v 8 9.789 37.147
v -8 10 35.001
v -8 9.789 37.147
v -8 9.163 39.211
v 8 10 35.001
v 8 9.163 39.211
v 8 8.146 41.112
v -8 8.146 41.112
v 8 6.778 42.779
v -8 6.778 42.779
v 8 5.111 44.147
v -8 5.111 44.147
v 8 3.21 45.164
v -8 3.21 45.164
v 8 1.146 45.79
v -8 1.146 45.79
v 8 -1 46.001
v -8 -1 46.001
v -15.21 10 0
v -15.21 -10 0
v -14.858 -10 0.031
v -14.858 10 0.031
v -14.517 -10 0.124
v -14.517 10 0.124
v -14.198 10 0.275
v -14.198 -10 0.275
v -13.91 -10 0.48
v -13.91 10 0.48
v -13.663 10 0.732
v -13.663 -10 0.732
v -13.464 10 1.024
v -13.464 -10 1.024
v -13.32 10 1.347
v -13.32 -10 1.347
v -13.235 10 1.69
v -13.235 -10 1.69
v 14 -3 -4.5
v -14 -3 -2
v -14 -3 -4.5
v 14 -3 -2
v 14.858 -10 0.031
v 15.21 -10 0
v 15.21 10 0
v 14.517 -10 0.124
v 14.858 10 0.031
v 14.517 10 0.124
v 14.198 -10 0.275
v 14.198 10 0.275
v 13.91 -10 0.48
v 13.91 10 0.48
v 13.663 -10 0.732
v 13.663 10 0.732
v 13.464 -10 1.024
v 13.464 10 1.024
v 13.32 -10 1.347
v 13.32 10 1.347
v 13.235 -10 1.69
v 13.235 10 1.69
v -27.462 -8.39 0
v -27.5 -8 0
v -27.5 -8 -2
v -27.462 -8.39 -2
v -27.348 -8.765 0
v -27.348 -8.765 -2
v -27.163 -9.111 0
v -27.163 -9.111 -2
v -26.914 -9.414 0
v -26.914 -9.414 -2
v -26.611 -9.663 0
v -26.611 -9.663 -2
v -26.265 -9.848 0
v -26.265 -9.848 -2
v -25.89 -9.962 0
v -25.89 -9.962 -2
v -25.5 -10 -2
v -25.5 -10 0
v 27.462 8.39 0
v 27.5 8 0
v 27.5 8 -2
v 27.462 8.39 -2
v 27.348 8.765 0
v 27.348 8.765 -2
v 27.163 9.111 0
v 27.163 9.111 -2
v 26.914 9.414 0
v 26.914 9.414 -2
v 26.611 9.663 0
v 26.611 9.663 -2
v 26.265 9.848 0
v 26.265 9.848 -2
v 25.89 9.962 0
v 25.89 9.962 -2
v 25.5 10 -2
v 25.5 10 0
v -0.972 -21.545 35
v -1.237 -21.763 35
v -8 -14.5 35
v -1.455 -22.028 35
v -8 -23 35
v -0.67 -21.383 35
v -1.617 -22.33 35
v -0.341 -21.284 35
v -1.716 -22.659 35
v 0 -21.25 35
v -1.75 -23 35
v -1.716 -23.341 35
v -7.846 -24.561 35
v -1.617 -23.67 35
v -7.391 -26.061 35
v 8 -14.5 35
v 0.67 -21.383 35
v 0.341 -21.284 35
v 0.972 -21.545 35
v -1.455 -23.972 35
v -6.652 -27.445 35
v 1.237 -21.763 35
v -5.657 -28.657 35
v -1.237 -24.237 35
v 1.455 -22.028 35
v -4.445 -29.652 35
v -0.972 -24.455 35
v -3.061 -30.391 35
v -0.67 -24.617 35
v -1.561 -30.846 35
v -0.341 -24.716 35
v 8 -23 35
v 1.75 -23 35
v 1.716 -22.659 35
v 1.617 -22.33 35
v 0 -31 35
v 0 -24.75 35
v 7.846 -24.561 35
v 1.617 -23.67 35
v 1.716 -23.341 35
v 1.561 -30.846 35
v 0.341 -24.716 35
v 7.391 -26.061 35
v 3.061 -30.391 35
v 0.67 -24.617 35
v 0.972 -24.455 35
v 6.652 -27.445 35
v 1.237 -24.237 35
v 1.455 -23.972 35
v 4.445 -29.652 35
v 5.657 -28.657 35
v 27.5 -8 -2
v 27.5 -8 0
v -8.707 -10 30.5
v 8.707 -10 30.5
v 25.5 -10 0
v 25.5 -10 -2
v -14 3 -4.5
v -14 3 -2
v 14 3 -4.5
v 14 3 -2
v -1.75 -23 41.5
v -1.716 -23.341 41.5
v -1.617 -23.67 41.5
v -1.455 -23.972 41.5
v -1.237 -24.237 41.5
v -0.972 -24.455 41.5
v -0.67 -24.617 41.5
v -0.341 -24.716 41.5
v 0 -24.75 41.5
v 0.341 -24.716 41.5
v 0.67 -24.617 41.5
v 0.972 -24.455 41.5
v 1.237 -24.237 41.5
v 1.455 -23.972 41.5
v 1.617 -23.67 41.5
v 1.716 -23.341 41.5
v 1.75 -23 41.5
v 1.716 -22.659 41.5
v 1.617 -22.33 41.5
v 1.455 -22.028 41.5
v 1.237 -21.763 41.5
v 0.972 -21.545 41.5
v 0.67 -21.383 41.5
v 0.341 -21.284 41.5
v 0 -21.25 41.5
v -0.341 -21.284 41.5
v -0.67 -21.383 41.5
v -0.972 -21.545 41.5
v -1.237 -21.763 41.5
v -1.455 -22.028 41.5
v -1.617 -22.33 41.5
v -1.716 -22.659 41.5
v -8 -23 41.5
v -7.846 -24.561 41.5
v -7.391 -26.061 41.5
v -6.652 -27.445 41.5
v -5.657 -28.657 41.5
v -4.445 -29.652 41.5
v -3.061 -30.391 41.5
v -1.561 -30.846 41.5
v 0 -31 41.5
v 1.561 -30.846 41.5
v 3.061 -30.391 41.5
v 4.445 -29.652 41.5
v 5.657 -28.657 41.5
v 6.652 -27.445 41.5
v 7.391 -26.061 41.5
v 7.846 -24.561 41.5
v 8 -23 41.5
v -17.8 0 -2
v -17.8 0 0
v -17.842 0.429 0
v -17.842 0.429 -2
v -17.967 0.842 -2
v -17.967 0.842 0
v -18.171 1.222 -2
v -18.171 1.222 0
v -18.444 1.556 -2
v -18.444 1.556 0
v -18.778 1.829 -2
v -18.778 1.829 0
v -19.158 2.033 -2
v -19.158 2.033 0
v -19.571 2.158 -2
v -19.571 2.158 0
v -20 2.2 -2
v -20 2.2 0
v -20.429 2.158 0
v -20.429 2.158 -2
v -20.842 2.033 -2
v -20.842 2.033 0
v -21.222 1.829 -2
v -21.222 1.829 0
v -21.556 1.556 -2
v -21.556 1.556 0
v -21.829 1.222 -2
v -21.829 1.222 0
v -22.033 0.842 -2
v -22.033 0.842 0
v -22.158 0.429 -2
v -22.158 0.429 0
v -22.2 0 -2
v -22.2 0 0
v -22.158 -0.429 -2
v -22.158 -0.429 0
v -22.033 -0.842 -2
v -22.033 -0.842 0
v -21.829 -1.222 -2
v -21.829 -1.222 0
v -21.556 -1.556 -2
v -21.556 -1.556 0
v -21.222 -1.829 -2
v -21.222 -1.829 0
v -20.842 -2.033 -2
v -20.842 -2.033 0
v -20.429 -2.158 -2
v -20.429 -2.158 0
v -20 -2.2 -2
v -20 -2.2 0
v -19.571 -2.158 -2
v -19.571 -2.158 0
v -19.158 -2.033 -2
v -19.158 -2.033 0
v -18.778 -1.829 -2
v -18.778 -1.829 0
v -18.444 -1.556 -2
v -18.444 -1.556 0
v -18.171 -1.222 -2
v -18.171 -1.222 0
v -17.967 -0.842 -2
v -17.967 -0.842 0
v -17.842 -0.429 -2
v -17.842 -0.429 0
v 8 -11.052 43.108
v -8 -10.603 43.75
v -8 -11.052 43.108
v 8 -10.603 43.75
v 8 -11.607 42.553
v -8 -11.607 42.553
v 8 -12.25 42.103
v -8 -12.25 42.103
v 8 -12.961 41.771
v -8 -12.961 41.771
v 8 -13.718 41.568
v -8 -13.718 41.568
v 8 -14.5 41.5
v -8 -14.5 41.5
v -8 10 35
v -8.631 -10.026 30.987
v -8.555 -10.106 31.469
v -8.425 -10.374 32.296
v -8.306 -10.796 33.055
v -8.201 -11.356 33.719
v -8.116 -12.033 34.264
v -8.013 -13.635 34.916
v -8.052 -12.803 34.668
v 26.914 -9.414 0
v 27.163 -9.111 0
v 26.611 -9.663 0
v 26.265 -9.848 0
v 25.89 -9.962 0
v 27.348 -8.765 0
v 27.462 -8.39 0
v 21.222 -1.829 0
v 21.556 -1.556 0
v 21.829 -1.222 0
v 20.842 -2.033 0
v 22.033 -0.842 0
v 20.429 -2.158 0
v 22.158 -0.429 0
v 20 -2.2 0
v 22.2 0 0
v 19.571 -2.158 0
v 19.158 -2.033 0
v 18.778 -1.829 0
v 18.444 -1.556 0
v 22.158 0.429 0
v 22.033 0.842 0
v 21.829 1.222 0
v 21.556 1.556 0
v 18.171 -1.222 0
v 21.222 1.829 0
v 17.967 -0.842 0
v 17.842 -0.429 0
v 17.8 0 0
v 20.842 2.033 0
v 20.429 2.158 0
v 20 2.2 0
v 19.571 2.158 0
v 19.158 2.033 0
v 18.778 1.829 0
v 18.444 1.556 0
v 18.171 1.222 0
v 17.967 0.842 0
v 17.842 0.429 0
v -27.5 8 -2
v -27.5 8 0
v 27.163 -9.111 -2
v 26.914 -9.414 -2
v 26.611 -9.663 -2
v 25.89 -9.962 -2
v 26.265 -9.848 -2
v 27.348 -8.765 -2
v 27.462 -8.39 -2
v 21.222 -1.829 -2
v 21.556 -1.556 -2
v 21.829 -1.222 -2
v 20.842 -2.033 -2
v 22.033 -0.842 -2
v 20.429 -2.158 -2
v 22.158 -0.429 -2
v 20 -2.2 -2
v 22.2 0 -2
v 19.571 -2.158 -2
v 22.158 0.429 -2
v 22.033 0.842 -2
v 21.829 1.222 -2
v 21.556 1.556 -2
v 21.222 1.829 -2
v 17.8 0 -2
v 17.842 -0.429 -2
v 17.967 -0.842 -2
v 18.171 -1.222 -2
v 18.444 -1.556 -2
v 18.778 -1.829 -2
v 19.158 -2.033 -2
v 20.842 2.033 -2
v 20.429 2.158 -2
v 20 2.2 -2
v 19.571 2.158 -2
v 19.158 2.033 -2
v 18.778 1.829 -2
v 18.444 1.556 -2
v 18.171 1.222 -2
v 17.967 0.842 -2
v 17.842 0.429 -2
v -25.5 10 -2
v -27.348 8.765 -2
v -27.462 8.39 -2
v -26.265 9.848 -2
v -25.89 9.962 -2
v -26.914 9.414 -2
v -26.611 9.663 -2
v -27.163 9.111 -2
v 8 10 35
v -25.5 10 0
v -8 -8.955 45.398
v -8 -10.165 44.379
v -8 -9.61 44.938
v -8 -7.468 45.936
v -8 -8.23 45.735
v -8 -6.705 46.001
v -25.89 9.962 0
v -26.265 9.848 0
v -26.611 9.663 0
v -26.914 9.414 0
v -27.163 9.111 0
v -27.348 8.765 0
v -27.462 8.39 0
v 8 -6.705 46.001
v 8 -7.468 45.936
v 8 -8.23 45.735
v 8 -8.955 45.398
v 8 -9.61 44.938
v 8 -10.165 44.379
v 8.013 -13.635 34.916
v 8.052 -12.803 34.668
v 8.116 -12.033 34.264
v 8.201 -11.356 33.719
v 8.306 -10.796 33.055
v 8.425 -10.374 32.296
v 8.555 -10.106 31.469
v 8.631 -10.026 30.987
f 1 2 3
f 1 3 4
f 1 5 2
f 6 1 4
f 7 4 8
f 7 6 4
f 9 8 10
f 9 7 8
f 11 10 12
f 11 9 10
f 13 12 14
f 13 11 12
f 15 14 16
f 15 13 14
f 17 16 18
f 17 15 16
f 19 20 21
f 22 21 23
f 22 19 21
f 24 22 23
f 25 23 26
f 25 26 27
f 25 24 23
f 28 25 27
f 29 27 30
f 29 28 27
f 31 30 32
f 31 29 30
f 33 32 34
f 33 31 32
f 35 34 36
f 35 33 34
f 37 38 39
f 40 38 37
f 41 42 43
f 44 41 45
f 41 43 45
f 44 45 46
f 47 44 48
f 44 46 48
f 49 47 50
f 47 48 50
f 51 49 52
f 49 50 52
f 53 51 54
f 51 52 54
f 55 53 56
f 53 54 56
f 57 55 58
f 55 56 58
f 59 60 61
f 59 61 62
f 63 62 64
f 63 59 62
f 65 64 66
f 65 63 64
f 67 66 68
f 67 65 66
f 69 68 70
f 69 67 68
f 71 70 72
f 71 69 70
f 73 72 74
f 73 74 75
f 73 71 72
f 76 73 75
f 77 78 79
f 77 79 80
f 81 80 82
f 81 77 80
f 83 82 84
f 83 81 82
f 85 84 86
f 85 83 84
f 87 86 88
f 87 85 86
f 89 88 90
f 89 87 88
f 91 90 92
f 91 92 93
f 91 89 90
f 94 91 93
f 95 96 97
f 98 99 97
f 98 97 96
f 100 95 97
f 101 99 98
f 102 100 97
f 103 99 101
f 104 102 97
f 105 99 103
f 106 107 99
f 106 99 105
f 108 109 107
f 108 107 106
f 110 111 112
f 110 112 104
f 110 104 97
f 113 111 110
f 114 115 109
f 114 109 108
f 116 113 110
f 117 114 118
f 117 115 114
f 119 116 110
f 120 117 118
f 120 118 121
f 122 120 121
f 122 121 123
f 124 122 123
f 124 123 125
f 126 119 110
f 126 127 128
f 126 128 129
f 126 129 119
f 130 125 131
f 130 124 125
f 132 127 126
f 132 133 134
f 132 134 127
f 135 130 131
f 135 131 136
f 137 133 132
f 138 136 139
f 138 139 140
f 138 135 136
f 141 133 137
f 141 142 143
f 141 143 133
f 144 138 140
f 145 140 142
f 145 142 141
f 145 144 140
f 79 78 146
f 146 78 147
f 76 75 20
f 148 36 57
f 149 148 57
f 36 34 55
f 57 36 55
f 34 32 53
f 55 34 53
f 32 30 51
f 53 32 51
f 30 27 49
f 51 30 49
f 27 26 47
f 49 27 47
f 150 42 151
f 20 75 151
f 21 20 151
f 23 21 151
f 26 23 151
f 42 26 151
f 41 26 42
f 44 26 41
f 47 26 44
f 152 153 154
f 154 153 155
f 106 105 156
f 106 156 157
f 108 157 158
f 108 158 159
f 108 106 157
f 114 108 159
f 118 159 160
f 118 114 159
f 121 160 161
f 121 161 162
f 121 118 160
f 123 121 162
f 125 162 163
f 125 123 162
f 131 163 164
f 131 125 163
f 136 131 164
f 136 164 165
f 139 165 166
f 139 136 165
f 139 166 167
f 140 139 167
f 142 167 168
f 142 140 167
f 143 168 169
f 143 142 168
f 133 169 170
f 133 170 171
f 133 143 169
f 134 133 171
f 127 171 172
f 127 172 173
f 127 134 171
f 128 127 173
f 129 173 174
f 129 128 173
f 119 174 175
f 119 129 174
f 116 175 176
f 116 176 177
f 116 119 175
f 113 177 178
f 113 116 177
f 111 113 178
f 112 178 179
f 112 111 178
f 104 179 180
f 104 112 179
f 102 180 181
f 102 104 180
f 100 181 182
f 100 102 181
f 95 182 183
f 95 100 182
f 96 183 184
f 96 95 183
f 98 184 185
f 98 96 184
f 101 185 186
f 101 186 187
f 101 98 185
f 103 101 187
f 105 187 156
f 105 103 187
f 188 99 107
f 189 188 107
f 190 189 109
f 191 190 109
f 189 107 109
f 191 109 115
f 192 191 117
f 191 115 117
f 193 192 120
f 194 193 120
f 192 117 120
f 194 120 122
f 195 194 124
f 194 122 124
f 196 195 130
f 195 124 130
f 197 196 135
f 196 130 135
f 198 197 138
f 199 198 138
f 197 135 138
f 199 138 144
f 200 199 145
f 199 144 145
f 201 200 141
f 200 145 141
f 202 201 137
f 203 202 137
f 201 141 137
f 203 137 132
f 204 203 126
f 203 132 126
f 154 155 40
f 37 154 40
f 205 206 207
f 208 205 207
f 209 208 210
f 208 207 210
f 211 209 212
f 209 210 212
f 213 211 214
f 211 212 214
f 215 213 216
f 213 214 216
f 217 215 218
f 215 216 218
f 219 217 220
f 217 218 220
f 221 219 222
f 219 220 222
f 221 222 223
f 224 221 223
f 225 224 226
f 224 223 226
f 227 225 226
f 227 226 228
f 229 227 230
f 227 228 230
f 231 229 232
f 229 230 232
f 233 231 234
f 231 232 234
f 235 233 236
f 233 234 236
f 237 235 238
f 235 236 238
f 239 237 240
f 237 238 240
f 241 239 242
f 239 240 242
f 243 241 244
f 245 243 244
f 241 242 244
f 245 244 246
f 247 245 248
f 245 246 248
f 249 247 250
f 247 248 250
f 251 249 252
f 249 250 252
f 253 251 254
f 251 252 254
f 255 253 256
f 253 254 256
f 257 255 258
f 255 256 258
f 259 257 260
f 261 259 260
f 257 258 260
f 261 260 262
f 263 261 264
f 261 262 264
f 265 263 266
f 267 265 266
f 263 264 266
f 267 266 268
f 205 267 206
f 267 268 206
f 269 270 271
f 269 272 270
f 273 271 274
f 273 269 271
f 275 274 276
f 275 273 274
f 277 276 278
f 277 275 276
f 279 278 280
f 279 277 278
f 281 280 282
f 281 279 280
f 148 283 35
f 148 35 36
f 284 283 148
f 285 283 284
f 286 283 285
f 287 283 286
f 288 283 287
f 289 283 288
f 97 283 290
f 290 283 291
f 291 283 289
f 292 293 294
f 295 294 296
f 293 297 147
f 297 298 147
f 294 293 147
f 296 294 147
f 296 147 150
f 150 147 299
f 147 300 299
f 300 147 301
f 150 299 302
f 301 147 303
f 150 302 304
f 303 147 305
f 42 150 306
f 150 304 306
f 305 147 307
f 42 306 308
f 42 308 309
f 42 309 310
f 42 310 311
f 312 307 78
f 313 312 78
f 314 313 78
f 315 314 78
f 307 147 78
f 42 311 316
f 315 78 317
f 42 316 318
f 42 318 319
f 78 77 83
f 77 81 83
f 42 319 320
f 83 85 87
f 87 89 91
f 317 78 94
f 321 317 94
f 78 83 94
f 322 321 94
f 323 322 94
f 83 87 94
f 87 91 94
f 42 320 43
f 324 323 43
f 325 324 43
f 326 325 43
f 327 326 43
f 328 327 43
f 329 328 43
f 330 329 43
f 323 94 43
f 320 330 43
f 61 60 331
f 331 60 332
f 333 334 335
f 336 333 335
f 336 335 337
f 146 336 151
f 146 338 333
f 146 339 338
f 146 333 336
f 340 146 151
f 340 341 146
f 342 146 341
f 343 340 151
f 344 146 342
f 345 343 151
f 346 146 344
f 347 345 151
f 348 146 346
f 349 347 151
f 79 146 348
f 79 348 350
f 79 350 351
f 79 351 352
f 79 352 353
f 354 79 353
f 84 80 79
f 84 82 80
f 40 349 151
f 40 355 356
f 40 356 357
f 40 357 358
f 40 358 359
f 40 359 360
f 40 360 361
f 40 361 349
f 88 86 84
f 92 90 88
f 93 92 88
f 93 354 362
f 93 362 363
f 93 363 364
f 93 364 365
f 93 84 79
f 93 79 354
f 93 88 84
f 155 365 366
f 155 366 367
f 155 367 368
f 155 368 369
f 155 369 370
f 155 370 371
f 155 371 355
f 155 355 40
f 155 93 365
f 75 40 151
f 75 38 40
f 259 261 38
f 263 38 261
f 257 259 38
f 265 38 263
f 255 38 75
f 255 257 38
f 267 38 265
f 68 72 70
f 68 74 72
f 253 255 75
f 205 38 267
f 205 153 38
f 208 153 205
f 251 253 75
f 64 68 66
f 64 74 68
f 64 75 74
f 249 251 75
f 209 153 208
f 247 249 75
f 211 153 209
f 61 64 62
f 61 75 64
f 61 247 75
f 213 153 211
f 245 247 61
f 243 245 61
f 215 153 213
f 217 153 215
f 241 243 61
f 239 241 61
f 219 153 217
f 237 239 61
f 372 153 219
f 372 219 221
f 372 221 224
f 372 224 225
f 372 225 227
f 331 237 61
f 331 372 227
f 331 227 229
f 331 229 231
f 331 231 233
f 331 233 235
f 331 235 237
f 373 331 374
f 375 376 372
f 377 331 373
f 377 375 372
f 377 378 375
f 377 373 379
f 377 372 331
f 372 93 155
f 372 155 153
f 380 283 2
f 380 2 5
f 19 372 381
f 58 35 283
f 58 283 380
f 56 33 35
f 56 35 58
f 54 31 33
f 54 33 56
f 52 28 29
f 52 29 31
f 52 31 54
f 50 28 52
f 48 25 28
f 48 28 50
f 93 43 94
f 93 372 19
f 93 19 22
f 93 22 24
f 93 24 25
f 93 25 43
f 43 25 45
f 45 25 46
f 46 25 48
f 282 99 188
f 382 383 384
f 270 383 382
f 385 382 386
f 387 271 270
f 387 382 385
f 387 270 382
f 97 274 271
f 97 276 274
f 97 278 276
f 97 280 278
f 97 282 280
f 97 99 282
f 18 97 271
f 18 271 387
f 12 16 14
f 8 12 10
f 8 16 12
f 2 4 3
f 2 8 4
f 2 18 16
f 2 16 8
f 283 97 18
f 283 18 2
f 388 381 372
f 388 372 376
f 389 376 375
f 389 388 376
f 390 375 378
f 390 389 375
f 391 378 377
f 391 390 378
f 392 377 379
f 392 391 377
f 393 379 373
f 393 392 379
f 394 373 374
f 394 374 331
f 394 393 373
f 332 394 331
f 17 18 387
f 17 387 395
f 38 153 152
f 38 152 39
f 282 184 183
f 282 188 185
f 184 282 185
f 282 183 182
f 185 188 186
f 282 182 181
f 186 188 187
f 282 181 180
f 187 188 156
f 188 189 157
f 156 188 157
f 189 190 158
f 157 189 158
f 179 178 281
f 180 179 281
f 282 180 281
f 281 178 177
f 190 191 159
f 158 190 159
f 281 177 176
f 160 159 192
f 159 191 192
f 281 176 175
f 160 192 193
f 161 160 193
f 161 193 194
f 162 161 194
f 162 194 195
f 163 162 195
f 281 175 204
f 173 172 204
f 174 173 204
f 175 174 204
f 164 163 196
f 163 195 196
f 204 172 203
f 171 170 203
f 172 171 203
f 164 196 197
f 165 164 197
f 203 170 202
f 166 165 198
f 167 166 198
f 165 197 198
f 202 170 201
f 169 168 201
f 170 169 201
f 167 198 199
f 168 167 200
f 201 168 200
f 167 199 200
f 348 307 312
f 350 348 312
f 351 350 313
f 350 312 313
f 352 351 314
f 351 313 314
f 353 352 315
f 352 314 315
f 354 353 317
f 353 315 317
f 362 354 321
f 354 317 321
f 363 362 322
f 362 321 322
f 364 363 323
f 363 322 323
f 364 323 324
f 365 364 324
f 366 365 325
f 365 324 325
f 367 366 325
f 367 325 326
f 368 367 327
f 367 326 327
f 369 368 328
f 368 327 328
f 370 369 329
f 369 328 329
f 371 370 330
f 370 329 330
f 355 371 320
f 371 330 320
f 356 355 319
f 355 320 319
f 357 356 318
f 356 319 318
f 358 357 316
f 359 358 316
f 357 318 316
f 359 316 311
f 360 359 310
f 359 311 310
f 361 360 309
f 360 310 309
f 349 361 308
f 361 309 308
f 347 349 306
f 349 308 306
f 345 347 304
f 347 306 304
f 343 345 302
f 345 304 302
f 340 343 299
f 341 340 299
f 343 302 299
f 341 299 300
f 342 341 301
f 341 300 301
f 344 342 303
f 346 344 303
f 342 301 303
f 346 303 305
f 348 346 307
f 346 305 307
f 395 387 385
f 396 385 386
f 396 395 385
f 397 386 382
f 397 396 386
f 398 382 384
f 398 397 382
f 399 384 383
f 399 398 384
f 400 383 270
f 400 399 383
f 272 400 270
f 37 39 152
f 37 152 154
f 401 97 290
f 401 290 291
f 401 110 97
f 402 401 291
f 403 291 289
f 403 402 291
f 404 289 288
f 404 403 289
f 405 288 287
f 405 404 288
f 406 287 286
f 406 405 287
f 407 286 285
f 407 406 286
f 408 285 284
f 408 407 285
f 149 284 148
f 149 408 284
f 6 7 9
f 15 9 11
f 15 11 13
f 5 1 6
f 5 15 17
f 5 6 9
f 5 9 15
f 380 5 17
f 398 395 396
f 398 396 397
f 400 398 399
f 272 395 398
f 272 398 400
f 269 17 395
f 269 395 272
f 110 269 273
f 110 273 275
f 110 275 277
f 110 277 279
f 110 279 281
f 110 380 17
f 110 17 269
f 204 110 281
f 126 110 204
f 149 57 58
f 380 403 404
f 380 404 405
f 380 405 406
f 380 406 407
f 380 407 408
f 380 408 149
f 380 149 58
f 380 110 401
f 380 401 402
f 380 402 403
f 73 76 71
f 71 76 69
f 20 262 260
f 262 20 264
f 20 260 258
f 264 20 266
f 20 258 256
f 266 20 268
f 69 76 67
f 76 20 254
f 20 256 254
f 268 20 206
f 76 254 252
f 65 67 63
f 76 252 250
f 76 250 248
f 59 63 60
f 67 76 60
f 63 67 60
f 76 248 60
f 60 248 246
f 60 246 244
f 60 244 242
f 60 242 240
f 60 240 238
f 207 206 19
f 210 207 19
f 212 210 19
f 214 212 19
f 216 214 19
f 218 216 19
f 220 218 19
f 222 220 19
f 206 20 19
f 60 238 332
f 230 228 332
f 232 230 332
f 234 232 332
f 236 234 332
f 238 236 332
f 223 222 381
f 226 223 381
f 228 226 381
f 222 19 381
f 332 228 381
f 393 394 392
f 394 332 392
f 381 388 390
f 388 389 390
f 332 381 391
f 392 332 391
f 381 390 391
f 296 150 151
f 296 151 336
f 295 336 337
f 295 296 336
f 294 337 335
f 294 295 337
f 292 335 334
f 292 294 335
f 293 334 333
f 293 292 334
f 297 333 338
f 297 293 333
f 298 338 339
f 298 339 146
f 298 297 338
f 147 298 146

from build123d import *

# Parameters (mm, degrees)
SKETCH035_R  = 2.2
PAD019_DEPTH = 2
SKETCH036_W  = 28
SKETCH036_H  = 6
PAD021_DEPTH = 2.5
SKETCH037_W  = 27
SKETCH037_H  = 20
SKETCH038_W  = 16
SKETCH038_H  = 20
FILLET006_R  = 2
SKETCH041_W  = 16
SKETCH041_H  = 20
PAD022_DEPTH = 11.001
SKETCH039_R  = 1.75
PAD023_DEPTH = 6.5
FILLET004_R  = 11
FILLET005_R  = 4.5
FILLET007_R  = 4.5


with BuildPart() as part:
    # Sketch035 → Pad019 (new body)
    with BuildSketch(Plane.XY):
        with BuildLine():
            Line((-25.5, 10), (25.5, 10))
            ThreePointArc((27.5, 8), (26.914214, 9.414214), (25.5, 10))
            Line((27.5, 8), (27.5, -8))
            ThreePointArc((25.5, -10), (26.914214, -9.414214), (27.5, -8))
            Line((25.5, -10), (-25.5, -10))
            ThreePointArc((-27.5, -8), (-26.914214, -9.414214), (-25.5, -10))
            Line((-27.5, -8), (-27.5, 8))
            ThreePointArc((-25.5, 10), (-26.914214, 9.414214), (-27.5, 8))
        make_face()
        with Locations((-20, 0)):
            Circle(SKETCH035_R, mode=Mode.SUBTRACT)
        with Locations((20, 0)):
            Circle(SKETCH035_R, mode=Mode.SUBTRACT)
    extrude(amount=-PAD019_DEPTH)

    # Sketch036 → Pad021 (join)
    with BuildSketch(Plane(origin=(0, 0, -2), x_dir=(1, 0, 0), z_dir=(0, 0, -1))):
        Rectangle(SKETCH036_W, SKETCH036_H)
    extrude(amount=PAD021_DEPTH)

    # Sketch037 → AdditiveLoft001 section 0
    with BuildSketch(Plane.XY):
        Rectangle(SKETCH037_W, SKETCH037_H)
    # Sketch038 → AdditiveLoft001 section 1
    with BuildSketch(Plane.XY.offset(35)):
        Rectangle(SKETCH038_W, SKETCH038_H)
    loft()

    # Fillet006
    fillet006_edges = [part.edges().sort_by_distance(p)[0] for p in [
        (-13.5, 0, 0),
        (13.5, 0, 0),
    ]]
    fillet(fillet006_edges, radius=FILLET006_R)

    # Sketch041 → Pad022 (join)
    with BuildSketch(Plane.XY.offset(35)):
        Rectangle(SKETCH041_W, SKETCH041_H)
    extrude(amount=PAD022_DEPTH)

    # Sketch039 → Pad023 (join)
    with BuildSketch(Plane(origin=(0, -10, 35), x_dir=(-1, 0, 0), z_dir=(0, 0, 1))):
        with BuildLine():
            Line((8, 0), (-8, 0))
            Line((-8, 0), (-8, 13))
            ThreePointArc((8, 13), (0, 21), (-8, 13))
            Line((8, 13), (8, 0))
        make_face()
        with Locations((0, 13)):
            Circle(SKETCH039_R, mode=Mode.SUBTRACT)
    extrude(amount=PAD023_DEPTH)

    # Fillet004
    fillet004_edges = [part.edges().sort_by_distance(p)[0] for p in [
        (0, 10, 46.001),
    ]]
    fillet(fillet004_edges, radius=FILLET004_R)

    # Fillet005
    fillet005_edges = [part.edges().sort_by_distance(p)[0] for p in [
        (0, -10, 41.5),
        (0, -10, 35),
    ]]
    fillet(fillet005_edges, radius=FILLET005_R)

    # Fillet007
    fillet007_edges = [part.edges().sort_by_distance(p)[0] for p in [
        (0, -10, 46.001),
    ]]
    fillet(fillet007_edges, radius=FILLET007_R)


solid = part.part
